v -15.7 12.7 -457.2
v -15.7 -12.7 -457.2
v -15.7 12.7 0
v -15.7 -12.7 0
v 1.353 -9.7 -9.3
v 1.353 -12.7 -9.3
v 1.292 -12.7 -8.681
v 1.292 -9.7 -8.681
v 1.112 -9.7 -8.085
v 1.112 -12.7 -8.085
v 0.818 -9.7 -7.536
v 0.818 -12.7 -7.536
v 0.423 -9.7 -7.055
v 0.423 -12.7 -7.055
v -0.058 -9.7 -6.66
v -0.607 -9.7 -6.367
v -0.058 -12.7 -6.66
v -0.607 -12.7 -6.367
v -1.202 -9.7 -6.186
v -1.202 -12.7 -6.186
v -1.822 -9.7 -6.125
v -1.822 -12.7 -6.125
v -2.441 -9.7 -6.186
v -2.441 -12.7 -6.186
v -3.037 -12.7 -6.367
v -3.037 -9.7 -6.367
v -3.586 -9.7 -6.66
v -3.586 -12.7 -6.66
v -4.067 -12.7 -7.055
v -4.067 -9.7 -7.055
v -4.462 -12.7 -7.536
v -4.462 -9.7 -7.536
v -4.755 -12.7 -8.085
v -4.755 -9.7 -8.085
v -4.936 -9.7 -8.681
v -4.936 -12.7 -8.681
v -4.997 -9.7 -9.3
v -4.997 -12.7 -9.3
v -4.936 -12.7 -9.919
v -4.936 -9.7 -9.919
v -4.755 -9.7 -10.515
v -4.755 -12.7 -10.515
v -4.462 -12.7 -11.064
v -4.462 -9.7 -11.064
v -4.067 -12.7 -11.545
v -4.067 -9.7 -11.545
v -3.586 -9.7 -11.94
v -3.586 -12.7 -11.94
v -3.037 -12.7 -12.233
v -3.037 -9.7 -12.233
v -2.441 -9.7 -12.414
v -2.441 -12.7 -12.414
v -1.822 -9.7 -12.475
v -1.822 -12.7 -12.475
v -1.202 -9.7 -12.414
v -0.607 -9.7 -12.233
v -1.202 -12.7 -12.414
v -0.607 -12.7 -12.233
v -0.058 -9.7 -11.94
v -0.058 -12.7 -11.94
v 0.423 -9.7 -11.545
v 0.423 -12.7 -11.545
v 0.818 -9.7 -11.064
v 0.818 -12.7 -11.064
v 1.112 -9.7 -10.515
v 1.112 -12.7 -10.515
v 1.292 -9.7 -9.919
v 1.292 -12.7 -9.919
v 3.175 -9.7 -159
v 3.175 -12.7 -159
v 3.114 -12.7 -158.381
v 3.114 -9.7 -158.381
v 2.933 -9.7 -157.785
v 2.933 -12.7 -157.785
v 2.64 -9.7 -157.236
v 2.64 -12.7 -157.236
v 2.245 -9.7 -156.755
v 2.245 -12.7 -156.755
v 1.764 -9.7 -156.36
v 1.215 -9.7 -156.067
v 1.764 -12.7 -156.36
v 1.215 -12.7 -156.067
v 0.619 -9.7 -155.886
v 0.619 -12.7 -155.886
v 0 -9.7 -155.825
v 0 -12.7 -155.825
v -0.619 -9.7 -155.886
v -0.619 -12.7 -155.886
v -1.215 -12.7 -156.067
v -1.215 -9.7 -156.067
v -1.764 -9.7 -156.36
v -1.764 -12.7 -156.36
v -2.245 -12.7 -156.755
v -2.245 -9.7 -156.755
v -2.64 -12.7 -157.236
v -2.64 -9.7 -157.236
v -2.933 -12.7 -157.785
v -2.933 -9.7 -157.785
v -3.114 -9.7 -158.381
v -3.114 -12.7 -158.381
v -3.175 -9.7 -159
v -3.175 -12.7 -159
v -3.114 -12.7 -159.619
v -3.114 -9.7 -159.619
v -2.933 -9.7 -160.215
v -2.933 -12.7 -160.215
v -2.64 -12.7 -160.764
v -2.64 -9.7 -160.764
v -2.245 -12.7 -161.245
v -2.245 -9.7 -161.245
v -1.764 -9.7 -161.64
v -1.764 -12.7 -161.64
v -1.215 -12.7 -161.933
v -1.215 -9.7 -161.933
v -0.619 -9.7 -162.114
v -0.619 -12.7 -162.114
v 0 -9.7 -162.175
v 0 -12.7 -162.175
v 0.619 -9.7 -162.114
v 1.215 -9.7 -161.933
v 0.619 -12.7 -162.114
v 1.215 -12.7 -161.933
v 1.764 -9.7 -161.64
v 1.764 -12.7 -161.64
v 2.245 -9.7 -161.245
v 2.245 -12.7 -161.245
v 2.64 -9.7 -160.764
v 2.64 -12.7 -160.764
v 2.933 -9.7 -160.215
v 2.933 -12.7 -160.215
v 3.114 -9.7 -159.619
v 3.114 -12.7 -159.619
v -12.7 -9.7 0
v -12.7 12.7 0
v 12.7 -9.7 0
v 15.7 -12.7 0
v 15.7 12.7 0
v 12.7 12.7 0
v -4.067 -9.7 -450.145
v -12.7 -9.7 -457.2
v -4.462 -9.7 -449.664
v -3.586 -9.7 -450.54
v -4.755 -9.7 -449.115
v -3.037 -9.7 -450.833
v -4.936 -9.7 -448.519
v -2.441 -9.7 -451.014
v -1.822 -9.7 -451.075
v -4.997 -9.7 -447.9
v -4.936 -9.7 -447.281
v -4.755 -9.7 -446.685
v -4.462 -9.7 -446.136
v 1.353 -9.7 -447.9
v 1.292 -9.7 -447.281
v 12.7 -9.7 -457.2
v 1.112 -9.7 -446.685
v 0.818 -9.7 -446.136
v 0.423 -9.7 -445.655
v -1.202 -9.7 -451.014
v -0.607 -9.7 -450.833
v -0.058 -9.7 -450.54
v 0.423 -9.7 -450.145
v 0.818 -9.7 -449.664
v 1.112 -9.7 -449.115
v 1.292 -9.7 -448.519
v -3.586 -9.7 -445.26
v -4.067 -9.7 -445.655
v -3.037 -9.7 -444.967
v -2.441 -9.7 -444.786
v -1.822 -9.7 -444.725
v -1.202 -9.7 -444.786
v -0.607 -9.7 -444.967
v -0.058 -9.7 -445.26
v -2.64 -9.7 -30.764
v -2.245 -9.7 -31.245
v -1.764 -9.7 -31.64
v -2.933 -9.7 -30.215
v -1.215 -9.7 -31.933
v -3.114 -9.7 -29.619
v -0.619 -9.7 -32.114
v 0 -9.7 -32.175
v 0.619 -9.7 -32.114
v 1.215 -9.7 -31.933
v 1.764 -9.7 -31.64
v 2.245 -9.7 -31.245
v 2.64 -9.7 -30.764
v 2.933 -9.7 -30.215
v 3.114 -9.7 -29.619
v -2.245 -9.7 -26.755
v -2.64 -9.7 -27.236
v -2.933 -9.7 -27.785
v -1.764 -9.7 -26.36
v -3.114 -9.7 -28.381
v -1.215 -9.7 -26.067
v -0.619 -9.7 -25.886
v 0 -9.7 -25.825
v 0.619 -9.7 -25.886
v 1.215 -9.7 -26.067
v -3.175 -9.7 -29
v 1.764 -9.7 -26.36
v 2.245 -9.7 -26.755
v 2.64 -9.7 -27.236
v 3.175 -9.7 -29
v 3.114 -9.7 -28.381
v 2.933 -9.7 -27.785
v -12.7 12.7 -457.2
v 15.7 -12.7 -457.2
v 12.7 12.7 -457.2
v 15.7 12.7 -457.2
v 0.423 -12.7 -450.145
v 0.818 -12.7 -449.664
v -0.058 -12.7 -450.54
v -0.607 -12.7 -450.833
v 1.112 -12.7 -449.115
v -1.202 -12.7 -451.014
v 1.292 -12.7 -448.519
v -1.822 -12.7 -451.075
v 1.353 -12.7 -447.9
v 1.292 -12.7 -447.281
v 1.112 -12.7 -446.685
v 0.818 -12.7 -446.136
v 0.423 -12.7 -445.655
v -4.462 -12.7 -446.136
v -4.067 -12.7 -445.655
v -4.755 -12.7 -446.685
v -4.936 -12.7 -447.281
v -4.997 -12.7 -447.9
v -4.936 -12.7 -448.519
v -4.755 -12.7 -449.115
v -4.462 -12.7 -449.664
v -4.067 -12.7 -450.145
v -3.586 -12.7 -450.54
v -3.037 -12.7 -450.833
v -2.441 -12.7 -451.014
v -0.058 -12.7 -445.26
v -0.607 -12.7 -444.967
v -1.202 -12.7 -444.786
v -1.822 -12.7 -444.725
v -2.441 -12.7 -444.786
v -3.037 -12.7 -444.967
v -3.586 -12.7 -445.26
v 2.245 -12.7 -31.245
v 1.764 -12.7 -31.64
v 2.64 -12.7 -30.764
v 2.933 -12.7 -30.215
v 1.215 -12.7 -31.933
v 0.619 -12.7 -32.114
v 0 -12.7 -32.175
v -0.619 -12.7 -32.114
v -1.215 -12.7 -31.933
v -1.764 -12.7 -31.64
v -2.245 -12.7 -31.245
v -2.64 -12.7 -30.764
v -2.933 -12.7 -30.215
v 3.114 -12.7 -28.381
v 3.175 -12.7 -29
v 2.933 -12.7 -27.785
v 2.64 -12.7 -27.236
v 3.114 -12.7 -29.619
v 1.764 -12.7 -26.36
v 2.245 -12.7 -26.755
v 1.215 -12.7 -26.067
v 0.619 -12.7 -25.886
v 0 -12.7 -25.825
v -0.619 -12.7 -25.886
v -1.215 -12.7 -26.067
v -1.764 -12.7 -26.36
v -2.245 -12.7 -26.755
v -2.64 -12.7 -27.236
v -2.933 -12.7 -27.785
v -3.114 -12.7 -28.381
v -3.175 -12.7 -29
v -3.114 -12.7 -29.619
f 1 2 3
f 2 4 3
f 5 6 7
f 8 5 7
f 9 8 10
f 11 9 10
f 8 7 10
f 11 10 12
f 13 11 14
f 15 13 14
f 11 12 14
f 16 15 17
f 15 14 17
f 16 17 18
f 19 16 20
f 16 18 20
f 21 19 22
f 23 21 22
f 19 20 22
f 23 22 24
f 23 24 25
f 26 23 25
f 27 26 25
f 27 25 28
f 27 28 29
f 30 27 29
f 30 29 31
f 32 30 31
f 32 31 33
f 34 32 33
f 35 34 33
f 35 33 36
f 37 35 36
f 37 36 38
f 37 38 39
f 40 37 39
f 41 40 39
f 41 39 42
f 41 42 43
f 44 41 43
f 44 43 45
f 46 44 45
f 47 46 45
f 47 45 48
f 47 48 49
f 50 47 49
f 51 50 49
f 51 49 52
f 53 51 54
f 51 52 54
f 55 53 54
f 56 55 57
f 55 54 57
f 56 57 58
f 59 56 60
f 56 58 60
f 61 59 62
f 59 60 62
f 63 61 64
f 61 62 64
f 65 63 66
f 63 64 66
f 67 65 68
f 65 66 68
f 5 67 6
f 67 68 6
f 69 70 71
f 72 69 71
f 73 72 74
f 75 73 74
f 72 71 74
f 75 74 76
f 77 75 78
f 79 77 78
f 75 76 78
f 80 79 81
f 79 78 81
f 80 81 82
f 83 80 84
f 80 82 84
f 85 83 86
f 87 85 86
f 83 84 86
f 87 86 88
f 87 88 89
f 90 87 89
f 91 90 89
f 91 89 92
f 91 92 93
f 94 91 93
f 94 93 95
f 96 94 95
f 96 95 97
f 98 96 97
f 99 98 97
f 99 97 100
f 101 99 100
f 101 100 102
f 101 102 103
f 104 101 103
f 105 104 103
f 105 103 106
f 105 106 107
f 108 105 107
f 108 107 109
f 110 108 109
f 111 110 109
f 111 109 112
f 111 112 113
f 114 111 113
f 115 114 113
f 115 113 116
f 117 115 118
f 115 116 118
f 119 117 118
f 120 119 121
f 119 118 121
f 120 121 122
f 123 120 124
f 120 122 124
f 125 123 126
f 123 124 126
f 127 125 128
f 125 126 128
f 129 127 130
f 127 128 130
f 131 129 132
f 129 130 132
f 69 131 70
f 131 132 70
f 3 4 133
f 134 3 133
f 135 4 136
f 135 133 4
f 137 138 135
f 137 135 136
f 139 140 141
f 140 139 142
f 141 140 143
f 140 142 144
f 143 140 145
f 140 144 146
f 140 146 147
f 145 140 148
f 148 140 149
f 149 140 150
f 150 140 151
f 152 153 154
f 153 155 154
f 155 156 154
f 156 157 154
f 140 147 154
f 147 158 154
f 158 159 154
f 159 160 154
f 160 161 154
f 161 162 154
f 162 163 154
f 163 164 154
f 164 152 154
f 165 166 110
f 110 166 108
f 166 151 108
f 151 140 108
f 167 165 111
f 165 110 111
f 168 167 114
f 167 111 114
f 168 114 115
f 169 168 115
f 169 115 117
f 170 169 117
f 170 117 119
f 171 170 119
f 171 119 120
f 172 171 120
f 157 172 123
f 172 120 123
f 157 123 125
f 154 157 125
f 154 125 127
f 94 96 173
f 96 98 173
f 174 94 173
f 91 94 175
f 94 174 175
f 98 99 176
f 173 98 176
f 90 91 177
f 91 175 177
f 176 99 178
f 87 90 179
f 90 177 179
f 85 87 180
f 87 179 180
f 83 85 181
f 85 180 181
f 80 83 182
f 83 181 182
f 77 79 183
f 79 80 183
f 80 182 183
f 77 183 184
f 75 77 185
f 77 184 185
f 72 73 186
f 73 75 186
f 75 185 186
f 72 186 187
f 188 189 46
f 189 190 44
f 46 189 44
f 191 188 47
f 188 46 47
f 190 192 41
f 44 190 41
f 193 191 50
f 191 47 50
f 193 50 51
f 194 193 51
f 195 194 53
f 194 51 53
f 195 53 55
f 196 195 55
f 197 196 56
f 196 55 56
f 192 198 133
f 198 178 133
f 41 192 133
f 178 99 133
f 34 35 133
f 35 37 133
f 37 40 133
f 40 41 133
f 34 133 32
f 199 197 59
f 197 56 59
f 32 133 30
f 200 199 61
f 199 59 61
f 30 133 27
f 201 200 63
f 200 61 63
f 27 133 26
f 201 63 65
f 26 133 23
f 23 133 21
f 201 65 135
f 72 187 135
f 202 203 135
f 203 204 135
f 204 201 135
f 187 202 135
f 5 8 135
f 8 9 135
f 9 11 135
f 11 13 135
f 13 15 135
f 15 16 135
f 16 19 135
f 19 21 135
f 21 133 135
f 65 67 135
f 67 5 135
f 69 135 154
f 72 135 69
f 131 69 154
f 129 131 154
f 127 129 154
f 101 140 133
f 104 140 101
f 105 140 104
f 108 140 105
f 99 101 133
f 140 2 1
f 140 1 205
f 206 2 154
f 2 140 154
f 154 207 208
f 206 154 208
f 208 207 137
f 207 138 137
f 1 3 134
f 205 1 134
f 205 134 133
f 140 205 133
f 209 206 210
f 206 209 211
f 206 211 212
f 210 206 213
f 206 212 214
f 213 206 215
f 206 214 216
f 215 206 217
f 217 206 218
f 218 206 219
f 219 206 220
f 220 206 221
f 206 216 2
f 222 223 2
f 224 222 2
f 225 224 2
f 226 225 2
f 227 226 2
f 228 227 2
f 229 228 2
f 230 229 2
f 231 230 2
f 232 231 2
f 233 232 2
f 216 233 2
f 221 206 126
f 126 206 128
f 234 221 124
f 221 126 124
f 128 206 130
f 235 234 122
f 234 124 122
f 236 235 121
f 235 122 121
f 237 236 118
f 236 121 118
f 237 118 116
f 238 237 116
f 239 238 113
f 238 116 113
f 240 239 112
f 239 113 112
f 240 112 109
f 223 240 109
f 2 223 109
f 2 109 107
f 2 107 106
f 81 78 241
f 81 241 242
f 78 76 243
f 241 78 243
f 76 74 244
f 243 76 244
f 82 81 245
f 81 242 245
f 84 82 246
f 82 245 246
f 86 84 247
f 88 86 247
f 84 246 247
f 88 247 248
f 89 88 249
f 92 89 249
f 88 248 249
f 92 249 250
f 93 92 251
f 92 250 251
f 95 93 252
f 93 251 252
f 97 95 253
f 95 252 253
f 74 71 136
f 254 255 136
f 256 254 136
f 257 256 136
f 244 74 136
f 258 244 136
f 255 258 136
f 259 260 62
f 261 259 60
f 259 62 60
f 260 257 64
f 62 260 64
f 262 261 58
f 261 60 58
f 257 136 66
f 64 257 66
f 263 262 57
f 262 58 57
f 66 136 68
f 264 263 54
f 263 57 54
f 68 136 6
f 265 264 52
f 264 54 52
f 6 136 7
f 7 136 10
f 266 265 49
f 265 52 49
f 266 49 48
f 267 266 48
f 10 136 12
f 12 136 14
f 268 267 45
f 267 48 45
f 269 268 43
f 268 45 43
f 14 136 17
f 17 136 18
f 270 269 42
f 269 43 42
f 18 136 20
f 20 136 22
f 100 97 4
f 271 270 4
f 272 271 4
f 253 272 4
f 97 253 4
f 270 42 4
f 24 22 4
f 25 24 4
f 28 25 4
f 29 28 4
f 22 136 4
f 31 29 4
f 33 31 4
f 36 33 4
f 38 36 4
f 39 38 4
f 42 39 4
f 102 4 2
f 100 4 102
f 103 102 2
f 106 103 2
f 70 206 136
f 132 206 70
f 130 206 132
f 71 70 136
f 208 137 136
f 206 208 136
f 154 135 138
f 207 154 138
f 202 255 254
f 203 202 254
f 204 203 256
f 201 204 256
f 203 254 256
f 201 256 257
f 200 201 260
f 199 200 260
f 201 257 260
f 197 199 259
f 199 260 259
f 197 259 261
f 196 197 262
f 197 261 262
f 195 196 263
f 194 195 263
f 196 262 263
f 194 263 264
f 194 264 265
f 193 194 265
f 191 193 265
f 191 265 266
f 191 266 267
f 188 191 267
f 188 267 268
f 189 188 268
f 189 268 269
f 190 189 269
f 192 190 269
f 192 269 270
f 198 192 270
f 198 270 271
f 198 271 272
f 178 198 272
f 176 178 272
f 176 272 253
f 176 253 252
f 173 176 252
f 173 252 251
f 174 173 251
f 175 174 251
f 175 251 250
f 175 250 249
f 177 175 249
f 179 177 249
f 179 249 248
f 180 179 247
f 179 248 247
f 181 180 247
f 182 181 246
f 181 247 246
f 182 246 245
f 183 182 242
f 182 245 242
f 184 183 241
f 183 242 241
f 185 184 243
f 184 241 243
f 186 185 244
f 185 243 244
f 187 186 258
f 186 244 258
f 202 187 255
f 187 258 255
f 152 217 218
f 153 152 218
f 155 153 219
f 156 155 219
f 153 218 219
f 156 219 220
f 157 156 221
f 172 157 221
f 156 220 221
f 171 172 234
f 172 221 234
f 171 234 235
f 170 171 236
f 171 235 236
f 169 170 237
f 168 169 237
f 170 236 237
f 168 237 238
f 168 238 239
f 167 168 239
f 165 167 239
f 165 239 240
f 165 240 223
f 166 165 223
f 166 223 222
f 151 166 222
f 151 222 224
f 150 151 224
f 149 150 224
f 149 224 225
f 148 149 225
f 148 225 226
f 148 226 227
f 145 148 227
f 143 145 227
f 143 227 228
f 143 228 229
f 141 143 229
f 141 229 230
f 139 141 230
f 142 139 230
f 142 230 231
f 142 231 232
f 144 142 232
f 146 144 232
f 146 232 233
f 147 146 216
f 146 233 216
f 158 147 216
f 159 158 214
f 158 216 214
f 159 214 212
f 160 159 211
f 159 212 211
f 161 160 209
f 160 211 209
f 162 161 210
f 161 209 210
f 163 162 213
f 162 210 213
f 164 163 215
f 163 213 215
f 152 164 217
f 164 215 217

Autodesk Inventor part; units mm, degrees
ref_plane "YZ Plane" through (0, 0, 0) normal (1, 0, 0) x (0, 1, 0)
ref_plane "XZ Plane" through (0, 0, 0) normal (0, 1, 0) x (-1, 0, 0)
ref_plane "XY Plane" through (0, 0, 0) normal (0, 0, 1) x (1, 0, 0)
sketch "Sketch1" plane through (0, 0, 0) normal (0, 0, 1) x (1, 0, 0)
  line L0 (-15.7, 12.7) -> (-12.7, 12.7)
  line L1 (-12.7, 12.7) -> (-12.7, -9.7)
  line L2 (-12.7, -9.7) -> (12.7, -9.7)
  line L3 (12.7, -9.7) -> (12.7, 12.7)
  line L4 (12.7, 12.7) -> (15.7, 12.7)
  line L5 (15.7, 12.7) -> (15.7, -12.7)
  line L6 (15.7, -12.7) -> (-15.7, -12.7)
  line L7 (-15.7, -12.7) -> (-15.7, 12.7)
  point P0 (0, 0)
  dimension "d0" = 3
  dimension "d2" = 3
  dimension "d3" = 25.4
  dimension "d4" = 31.4
  dimension "d5" = 15.7
  dimension "d7" = 12.7
  dimension "d8" = 3
extrude "Extrusion1" add sketch "Sketch1" against normal blind 457.2
sketch "Sketch7" plane through (-15.7, -12.7, 0) normal (0, -1, 0) x (1, 0, 0)
  circle A0 centre (13.8784, -447.9) radius 3.175
  point P0 (15.7, 0)
  dimension "d25" = 6.35
extrude "Extrusion5" cut sketch "Sketch7" against normal blind 10
sketch "Sketch8" plane through (-15.7, -12.7, 0) normal (0, -1, 0) x (1, 0, 0)
  line L0 (0, -184) -> (31.4, -184) construction
  line L1 (31.4, -134) -> (0, -134) construction
  line L2 (31.4, -134) -> (31.4, -184) construction
  line L3 (15.7, -134) -> (15.7, -159) construction
  line L4 (15.7, -159) -> (31.4, -159) construction
  circle A0 centre (15.7, -159) radius 3.175
  point P0 (15.7, 0)
  dimension "d29" = 6.35
extrude "Extrusion6" cut sketch "Sketch8" against normal blind 10
sketch "Sketch9" plane through (-15.7, -12.7, 0) normal (0, -1, 0) x (1, 0, 0)
  circle A0 centre (13.8784, -9.3) radius 3.175
  circle A1 centre (15.7, -29) radius 3.175
  point P0 (15.7, 0)
extrude "Extrusion7" cut sketch "Sketch9" against normal blind 10
equation "\"d2\" = d0"
equation "\"d5\" = 0.5 * d4"
equation "\"d7\" = 0.5 * d3"
equation "\"d8\" = d0"
properties part number "18in C-Channel Front" material "Aluminum 6061"
